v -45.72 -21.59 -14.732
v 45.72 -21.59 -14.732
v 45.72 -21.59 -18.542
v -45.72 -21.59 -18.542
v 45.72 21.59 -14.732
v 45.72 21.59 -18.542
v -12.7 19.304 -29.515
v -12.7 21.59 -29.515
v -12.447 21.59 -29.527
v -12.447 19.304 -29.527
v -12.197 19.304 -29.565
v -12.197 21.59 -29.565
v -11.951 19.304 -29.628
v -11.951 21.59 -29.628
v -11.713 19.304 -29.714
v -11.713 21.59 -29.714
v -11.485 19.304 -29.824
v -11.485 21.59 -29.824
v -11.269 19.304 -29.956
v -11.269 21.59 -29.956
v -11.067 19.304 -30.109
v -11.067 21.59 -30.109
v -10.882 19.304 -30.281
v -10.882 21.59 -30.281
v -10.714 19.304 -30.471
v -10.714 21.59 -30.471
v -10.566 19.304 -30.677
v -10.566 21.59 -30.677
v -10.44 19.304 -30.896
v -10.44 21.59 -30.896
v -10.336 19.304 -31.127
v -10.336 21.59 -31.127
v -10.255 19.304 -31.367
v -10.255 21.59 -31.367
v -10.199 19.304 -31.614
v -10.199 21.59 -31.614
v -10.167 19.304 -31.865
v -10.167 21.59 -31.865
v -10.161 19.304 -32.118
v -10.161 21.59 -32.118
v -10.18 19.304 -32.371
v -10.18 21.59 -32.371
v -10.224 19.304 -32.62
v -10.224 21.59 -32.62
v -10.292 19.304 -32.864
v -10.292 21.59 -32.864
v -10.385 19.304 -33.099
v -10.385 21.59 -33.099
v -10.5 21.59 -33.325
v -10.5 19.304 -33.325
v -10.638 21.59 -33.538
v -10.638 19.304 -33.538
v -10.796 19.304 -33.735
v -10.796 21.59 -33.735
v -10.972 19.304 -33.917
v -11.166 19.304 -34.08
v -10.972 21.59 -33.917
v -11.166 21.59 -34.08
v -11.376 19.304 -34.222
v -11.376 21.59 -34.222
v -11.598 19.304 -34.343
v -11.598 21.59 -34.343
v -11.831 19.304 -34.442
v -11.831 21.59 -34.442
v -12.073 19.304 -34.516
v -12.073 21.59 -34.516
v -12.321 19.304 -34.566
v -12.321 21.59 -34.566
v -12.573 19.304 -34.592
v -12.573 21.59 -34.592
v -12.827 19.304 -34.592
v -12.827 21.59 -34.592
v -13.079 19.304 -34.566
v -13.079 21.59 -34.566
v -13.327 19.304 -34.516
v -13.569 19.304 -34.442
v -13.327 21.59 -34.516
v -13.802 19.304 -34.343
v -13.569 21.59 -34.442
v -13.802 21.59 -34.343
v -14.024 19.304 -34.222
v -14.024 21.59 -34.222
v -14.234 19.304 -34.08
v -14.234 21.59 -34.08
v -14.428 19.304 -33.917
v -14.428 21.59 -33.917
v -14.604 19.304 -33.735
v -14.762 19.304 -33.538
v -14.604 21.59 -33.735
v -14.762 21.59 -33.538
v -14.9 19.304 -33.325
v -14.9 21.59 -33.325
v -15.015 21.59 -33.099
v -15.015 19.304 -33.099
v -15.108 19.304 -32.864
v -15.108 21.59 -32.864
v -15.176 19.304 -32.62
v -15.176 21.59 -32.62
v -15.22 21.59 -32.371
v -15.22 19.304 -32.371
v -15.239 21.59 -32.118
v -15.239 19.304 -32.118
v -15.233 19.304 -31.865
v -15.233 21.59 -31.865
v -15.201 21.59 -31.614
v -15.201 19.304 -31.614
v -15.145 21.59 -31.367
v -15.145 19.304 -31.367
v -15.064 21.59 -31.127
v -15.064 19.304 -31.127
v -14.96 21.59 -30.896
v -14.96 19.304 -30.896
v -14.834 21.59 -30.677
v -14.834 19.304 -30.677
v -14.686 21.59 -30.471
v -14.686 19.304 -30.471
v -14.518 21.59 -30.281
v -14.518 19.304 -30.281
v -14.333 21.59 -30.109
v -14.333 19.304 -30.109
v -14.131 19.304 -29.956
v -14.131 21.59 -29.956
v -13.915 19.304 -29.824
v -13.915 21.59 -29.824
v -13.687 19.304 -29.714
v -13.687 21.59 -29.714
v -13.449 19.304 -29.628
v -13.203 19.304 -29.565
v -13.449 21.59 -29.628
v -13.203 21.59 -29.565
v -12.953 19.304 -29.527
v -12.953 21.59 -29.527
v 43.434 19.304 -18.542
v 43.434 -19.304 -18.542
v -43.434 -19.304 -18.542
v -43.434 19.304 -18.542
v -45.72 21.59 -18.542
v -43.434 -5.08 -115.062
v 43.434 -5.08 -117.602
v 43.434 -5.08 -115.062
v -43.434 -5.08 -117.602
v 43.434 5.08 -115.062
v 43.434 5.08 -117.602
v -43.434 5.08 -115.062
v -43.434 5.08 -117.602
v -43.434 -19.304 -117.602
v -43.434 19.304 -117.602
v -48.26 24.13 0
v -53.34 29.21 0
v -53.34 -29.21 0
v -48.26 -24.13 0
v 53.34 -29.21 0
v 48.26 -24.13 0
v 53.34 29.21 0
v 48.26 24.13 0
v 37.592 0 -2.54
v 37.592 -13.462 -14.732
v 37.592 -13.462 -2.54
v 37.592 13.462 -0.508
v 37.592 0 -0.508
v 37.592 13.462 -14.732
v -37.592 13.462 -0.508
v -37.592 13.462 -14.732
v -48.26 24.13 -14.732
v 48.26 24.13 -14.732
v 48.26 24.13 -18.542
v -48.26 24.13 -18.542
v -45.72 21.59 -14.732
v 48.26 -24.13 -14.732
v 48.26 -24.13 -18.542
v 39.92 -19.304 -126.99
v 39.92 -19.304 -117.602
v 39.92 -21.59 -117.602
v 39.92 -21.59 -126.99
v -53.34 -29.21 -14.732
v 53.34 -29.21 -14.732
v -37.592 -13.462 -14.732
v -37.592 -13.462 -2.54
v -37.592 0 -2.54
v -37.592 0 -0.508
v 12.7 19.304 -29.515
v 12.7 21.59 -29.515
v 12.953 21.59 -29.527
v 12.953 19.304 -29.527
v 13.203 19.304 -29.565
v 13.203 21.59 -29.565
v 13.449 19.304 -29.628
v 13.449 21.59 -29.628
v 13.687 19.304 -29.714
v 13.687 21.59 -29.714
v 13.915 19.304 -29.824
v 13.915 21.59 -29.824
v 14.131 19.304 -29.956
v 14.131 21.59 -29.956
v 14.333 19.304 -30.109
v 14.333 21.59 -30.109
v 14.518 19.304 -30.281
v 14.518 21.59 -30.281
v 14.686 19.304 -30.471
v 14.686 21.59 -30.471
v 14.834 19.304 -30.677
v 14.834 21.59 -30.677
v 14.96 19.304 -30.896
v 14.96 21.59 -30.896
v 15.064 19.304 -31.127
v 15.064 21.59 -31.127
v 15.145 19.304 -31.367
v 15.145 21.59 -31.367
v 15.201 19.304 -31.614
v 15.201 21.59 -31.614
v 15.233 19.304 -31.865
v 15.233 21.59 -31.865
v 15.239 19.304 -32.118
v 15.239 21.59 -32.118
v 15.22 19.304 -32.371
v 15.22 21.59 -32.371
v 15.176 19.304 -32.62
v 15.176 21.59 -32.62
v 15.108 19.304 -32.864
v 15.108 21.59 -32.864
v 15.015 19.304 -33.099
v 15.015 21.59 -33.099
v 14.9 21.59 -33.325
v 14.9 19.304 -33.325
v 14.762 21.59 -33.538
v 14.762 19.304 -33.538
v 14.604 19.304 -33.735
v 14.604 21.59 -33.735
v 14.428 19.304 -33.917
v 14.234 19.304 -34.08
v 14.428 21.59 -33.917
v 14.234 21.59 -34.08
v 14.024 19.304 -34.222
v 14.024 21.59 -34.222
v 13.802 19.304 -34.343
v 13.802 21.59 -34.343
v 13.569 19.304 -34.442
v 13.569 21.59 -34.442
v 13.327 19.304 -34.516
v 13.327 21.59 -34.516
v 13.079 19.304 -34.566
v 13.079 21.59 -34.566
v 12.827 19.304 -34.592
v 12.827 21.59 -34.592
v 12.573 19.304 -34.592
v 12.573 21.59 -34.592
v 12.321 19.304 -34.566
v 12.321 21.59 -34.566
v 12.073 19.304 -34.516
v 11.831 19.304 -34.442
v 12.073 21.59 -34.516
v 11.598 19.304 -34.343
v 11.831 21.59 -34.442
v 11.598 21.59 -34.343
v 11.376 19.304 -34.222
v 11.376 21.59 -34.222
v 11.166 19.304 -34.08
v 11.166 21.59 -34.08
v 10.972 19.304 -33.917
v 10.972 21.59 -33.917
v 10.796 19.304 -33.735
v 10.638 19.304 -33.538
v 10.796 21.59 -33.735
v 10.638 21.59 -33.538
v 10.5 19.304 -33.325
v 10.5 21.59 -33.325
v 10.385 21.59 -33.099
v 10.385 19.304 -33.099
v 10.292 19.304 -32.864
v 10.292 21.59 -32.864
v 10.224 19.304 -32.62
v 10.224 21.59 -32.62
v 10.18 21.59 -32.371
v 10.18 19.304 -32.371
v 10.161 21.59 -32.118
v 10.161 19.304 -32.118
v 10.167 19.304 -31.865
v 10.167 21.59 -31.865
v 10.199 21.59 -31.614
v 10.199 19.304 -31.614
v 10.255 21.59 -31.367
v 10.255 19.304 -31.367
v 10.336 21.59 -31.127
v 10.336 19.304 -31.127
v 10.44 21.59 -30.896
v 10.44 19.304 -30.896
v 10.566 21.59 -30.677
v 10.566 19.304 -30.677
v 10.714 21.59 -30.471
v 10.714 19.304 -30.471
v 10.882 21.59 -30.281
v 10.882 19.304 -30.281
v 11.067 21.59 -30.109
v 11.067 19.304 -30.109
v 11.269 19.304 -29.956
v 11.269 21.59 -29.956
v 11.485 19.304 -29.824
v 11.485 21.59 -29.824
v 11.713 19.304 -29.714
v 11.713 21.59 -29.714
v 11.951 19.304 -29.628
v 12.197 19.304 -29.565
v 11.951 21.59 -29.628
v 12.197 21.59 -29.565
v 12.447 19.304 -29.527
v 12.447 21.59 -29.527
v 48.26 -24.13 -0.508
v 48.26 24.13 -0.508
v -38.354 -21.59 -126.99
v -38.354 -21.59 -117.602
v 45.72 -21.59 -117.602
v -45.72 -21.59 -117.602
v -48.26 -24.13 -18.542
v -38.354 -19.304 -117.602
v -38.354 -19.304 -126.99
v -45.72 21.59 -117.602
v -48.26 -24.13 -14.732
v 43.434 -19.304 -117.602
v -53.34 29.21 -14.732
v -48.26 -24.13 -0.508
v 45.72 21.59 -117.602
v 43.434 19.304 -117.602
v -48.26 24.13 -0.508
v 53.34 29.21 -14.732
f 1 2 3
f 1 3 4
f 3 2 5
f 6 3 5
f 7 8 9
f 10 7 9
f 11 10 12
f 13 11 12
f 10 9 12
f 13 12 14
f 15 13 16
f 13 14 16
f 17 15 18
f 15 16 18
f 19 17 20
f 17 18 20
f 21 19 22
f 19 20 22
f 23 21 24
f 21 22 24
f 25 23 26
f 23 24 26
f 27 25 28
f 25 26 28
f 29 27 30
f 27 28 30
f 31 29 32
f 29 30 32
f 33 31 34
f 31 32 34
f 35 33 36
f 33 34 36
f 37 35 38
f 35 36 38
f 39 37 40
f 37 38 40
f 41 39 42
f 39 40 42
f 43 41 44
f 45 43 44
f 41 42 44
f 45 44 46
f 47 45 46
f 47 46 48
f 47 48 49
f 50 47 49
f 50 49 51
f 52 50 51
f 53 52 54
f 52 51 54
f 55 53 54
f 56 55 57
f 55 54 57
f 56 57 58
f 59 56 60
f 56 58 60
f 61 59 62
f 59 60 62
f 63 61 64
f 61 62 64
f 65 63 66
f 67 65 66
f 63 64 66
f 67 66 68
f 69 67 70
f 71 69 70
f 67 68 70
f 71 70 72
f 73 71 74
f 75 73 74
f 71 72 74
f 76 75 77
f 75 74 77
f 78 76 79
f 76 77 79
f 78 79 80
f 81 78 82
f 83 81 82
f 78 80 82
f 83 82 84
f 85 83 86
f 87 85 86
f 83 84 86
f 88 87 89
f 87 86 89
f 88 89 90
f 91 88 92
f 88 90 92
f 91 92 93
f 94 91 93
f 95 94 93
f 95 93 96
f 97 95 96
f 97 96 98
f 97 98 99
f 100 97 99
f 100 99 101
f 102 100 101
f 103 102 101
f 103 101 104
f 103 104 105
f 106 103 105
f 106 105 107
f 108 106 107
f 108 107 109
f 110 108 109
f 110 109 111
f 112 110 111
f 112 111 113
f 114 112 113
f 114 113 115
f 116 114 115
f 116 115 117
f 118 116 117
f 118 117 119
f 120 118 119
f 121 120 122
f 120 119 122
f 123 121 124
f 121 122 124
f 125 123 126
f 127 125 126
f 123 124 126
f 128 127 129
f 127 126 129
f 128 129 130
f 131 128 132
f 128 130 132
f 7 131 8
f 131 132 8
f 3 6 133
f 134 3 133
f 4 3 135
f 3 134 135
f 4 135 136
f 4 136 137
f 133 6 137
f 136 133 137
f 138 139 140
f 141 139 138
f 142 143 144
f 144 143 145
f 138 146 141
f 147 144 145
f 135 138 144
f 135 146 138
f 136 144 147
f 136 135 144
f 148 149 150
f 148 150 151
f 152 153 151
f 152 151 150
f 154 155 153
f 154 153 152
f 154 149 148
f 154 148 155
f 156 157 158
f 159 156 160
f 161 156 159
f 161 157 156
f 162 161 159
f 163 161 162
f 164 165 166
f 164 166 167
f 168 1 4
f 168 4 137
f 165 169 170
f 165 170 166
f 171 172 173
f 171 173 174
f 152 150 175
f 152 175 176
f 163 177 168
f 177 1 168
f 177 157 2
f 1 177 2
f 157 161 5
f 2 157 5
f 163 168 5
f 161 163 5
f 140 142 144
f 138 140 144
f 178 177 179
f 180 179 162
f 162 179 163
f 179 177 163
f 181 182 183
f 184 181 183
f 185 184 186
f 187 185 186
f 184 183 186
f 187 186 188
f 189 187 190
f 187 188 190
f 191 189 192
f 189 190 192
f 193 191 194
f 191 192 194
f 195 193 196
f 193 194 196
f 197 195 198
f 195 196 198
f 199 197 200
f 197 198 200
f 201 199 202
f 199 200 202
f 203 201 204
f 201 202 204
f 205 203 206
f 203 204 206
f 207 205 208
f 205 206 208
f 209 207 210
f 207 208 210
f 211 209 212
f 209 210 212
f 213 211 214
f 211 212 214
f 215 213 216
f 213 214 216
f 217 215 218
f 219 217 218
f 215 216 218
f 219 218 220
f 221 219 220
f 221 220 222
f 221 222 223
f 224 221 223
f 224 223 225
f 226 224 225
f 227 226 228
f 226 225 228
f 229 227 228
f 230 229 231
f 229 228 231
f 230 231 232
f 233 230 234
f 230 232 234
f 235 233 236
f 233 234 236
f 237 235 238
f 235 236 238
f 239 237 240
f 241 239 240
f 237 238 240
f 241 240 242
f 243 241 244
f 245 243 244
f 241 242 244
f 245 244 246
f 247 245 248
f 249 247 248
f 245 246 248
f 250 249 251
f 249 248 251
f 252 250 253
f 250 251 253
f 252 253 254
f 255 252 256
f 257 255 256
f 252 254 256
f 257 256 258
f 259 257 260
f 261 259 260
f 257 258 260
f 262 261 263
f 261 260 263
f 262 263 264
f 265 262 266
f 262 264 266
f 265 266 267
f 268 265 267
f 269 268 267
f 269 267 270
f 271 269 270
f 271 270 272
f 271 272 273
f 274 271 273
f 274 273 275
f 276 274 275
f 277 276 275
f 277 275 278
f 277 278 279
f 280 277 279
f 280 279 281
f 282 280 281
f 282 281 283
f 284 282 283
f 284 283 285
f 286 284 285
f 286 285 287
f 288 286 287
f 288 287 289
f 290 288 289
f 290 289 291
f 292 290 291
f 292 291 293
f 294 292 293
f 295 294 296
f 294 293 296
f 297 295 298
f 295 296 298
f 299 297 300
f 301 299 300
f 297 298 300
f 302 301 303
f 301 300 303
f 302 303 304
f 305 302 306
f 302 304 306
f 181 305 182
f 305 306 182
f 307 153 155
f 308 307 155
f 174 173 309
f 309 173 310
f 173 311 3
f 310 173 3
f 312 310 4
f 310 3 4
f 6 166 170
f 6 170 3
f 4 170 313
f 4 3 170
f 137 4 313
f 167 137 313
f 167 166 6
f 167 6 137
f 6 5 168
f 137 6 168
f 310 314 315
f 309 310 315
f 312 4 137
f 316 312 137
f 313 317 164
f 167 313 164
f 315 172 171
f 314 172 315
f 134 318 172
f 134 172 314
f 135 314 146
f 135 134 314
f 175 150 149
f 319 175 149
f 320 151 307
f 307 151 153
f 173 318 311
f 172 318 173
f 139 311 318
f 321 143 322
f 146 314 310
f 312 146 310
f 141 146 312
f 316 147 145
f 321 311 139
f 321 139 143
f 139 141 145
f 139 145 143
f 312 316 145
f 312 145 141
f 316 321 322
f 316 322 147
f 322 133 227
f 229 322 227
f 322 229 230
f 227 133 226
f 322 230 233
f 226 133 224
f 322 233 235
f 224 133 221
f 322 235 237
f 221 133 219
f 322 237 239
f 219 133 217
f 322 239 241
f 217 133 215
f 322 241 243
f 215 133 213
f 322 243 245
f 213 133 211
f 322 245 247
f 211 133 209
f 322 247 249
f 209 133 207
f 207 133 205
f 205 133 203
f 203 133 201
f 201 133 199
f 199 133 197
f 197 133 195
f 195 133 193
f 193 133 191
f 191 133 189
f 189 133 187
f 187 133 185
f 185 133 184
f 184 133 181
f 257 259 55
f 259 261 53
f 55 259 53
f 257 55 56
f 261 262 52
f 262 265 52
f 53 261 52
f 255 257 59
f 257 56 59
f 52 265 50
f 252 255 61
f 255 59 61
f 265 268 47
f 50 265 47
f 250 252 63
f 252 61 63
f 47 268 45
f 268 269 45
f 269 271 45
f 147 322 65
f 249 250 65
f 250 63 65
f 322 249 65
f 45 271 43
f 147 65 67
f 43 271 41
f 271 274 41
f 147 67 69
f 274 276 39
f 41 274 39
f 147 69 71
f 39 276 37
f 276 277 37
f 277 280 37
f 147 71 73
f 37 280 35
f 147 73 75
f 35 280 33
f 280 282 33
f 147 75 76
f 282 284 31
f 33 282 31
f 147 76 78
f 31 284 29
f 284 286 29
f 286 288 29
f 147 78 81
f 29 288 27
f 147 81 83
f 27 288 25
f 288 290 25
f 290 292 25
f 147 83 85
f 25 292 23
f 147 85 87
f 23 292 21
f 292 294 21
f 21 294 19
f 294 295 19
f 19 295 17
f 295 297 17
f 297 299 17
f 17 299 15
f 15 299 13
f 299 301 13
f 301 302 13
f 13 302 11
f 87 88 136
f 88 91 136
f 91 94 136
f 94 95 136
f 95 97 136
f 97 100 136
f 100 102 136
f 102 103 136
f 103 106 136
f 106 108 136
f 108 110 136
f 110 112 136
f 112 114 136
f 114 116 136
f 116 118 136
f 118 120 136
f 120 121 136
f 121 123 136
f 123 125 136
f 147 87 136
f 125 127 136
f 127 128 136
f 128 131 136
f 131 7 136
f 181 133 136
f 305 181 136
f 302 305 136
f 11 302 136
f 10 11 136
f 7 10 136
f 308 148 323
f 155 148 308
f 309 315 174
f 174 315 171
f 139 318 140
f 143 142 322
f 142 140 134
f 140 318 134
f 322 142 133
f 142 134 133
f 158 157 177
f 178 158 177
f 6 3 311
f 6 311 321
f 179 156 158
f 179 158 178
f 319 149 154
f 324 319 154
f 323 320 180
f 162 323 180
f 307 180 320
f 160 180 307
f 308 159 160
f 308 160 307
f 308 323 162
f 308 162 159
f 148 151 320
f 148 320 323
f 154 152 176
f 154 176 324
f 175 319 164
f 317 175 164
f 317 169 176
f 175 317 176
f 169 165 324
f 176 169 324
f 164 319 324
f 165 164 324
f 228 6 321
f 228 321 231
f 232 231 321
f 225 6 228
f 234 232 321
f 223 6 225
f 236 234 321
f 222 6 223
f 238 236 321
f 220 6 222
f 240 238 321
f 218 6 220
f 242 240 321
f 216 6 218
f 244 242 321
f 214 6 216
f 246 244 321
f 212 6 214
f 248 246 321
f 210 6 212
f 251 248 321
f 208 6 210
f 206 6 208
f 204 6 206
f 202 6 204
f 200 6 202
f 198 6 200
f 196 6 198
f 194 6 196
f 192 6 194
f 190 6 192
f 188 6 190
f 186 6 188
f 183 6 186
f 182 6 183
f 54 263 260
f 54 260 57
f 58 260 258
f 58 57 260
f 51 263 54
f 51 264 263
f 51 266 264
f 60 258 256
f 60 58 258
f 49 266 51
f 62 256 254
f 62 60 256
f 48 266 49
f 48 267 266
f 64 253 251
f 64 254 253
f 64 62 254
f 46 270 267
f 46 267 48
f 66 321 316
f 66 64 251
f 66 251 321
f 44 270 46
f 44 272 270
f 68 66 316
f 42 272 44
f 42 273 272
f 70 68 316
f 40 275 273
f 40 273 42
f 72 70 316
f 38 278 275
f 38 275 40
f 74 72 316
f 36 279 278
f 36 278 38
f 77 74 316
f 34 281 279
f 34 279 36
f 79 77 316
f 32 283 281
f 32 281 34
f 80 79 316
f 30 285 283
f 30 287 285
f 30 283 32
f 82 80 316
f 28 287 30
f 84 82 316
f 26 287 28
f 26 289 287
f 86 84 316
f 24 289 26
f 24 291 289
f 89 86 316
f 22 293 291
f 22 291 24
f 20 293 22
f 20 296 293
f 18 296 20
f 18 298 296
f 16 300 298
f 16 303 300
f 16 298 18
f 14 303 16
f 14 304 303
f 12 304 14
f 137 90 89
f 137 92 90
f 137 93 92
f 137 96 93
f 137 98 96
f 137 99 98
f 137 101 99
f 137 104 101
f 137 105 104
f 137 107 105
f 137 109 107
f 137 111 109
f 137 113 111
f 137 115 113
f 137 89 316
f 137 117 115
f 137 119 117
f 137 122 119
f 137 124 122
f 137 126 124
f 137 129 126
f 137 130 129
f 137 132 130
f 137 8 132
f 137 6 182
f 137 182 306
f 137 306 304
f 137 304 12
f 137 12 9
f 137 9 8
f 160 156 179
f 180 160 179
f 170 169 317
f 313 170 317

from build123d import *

# Parameters (mm, degrees)
SKETCH1_W           = 106.68
SKETCH1_H           = 58.42
BOSS_EXTRUDE1_DEPTH = 14.732
SKETCH2_W           = 96.52
SKETCH2_H           = 48.26
CUT_EXTRUDE1_DEPTH  = 0.508
SKETCH3_W           = 75.184
SKETCH3_H           = 26.924
CUT_EXTRUDE2_DEPTH  = 12.192
SKETCH4_W           = 75.184
SKETCH4_H           = 13.462
CUT_EXTRUDE3_DEPTH  = 12.192
SKETCH5_W           = 96.52
SKETCH5_H           = 48.26
SKETCH5_W_2         = 91.44
SKETCH5_H_2         = 43.18
BOSS_EXTRUDE2_DEPTH = 3.81
SKETCH6_W           = 91.44
SKETCH6_H           = 43.18
SKETCH6_W_2         = 86.868
SKETCH6_H_2         = 38.608
BOSS_EXTRUDE3_DEPTH = 99.06
SKETCH7_W           = 86.868
SKETCH7_H           = 10.16
BOSS_EXTRUDE4_DEPTH = 2.54
SKETCH8_W           = 78.274407713
SKETCH8_H           = 9.388134975
BOSS_EXTRUDE5_DEPTH = 2.286
SKETCH9_R           = 2.54
CUT_EXTRUDE4_DEPTH  = 2.286


with BuildPart() as part:
    # Sketch1 → Boss-Extrude1 (new body)
    with BuildSketch(Plane.XY):
        Rectangle(SKETCH1_W, SKETCH1_H)
    extrude(amount=-BOSS_EXTRUDE1_DEPTH)

    # Sketch2 → Cut-Extrude1 (cut)
    with BuildSketch(Plane.XY):
        Rectangle(SKETCH2_W, SKETCH2_H)
    extrude(amount=-CUT_EXTRUDE1_DEPTH, mode=Mode.SUBTRACT)

    # Sketch3 → Cut-Extrude2 (cut)
    with BuildSketch(Plane(origin=(0, 0, -14.732), x_dir=(-1, 0, 0), z_dir=(0, 0, -1))):
        Rectangle(SKETCH3_W, SKETCH3_H)
    extrude(amount=-CUT_EXTRUDE2_DEPTH, mode=Mode.SUBTRACT)

    # Sketch4 → Cut-Extrude3 (cut)
    with BuildSketch(Plane(origin=(0, 0, -2.54), x_dir=(-1, 0, 0), z_dir=(0, 0, -1))):
        with Locations((0, 6.731)):
            Rectangle(SKETCH4_W, SKETCH4_H)
    extrude(amount=-CUT_EXTRUDE3_DEPTH, mode=Mode.SUBTRACT)

    # Sketch5 → Boss-Extrude2 (add)
    with BuildSketch(Plane(origin=(0, 0, -14.732), x_dir=(-1, 0, 0), z_dir=(0, 0, -1))):
        Rectangle(SKETCH5_W, SKETCH5_H)
        Rectangle(SKETCH5_W_2, SKETCH5_H_2, mode=Mode.SUBTRACT)
    extrude(amount=BOSS_EXTRUDE2_DEPTH)


with BuildPart() as body_2:
    # Sketch6 → Boss-Extrude3 (new body)
    with BuildSketch(Plane(origin=(0, 0, -18.542), x_dir=(-1, 0, 0), z_dir=(0, 0, -1))):
        Rectangle(SKETCH6_W, SKETCH6_H)
        Rectangle(SKETCH6_W_2, SKETCH6_H_2, mode=Mode.SUBTRACT)
    extrude(amount=BOSS_EXTRUDE3_DEPTH)

    # Sketch7 → Boss-Extrude4 (add)
    with BuildSketch(Plane(origin=(0, 0, -117.602), x_dir=(-1, 0, 0), z_dir=(0, 0, -1))):
        Rectangle(SKETCH7_W, SKETCH7_H)
    extrude(amount=-BOSS_EXTRUDE4_DEPTH)

    # Sketch8 → Boss-Extrude5 (add)
    with BuildSketch(Plane(origin=(0, -19.304, 0), x_dir=(1, 0, 0), z_dir=(0, 1, 0))):
        with Locations((0.783203857, 122.296067488)):
            Rectangle(SKETCH8_W, SKETCH8_H)
    extrude(amount=-BOSS_EXTRUDE5_DEPTH)

    # Sketch9 → Cut-Extrude4 (cut)
    with BuildSketch(Plane(origin=(0, 21.59, 0), x_dir=(1, 0, 0), z_dir=(0, 1, 0))):
        with Locations(Location((12.7, 32.0548, 0), (0, 0, 270))):
            Circle(SKETCH9_R)
        with Locations(Location((-12.7, 32.0548, 0), (0, 0, 270))):
            Circle(SKETCH9_R)
    extrude(amount=-CUT_EXTRUDE4_DEPTH, mode=Mode.SUBTRACT)


solid = Compound([part.part, body_2.part])
